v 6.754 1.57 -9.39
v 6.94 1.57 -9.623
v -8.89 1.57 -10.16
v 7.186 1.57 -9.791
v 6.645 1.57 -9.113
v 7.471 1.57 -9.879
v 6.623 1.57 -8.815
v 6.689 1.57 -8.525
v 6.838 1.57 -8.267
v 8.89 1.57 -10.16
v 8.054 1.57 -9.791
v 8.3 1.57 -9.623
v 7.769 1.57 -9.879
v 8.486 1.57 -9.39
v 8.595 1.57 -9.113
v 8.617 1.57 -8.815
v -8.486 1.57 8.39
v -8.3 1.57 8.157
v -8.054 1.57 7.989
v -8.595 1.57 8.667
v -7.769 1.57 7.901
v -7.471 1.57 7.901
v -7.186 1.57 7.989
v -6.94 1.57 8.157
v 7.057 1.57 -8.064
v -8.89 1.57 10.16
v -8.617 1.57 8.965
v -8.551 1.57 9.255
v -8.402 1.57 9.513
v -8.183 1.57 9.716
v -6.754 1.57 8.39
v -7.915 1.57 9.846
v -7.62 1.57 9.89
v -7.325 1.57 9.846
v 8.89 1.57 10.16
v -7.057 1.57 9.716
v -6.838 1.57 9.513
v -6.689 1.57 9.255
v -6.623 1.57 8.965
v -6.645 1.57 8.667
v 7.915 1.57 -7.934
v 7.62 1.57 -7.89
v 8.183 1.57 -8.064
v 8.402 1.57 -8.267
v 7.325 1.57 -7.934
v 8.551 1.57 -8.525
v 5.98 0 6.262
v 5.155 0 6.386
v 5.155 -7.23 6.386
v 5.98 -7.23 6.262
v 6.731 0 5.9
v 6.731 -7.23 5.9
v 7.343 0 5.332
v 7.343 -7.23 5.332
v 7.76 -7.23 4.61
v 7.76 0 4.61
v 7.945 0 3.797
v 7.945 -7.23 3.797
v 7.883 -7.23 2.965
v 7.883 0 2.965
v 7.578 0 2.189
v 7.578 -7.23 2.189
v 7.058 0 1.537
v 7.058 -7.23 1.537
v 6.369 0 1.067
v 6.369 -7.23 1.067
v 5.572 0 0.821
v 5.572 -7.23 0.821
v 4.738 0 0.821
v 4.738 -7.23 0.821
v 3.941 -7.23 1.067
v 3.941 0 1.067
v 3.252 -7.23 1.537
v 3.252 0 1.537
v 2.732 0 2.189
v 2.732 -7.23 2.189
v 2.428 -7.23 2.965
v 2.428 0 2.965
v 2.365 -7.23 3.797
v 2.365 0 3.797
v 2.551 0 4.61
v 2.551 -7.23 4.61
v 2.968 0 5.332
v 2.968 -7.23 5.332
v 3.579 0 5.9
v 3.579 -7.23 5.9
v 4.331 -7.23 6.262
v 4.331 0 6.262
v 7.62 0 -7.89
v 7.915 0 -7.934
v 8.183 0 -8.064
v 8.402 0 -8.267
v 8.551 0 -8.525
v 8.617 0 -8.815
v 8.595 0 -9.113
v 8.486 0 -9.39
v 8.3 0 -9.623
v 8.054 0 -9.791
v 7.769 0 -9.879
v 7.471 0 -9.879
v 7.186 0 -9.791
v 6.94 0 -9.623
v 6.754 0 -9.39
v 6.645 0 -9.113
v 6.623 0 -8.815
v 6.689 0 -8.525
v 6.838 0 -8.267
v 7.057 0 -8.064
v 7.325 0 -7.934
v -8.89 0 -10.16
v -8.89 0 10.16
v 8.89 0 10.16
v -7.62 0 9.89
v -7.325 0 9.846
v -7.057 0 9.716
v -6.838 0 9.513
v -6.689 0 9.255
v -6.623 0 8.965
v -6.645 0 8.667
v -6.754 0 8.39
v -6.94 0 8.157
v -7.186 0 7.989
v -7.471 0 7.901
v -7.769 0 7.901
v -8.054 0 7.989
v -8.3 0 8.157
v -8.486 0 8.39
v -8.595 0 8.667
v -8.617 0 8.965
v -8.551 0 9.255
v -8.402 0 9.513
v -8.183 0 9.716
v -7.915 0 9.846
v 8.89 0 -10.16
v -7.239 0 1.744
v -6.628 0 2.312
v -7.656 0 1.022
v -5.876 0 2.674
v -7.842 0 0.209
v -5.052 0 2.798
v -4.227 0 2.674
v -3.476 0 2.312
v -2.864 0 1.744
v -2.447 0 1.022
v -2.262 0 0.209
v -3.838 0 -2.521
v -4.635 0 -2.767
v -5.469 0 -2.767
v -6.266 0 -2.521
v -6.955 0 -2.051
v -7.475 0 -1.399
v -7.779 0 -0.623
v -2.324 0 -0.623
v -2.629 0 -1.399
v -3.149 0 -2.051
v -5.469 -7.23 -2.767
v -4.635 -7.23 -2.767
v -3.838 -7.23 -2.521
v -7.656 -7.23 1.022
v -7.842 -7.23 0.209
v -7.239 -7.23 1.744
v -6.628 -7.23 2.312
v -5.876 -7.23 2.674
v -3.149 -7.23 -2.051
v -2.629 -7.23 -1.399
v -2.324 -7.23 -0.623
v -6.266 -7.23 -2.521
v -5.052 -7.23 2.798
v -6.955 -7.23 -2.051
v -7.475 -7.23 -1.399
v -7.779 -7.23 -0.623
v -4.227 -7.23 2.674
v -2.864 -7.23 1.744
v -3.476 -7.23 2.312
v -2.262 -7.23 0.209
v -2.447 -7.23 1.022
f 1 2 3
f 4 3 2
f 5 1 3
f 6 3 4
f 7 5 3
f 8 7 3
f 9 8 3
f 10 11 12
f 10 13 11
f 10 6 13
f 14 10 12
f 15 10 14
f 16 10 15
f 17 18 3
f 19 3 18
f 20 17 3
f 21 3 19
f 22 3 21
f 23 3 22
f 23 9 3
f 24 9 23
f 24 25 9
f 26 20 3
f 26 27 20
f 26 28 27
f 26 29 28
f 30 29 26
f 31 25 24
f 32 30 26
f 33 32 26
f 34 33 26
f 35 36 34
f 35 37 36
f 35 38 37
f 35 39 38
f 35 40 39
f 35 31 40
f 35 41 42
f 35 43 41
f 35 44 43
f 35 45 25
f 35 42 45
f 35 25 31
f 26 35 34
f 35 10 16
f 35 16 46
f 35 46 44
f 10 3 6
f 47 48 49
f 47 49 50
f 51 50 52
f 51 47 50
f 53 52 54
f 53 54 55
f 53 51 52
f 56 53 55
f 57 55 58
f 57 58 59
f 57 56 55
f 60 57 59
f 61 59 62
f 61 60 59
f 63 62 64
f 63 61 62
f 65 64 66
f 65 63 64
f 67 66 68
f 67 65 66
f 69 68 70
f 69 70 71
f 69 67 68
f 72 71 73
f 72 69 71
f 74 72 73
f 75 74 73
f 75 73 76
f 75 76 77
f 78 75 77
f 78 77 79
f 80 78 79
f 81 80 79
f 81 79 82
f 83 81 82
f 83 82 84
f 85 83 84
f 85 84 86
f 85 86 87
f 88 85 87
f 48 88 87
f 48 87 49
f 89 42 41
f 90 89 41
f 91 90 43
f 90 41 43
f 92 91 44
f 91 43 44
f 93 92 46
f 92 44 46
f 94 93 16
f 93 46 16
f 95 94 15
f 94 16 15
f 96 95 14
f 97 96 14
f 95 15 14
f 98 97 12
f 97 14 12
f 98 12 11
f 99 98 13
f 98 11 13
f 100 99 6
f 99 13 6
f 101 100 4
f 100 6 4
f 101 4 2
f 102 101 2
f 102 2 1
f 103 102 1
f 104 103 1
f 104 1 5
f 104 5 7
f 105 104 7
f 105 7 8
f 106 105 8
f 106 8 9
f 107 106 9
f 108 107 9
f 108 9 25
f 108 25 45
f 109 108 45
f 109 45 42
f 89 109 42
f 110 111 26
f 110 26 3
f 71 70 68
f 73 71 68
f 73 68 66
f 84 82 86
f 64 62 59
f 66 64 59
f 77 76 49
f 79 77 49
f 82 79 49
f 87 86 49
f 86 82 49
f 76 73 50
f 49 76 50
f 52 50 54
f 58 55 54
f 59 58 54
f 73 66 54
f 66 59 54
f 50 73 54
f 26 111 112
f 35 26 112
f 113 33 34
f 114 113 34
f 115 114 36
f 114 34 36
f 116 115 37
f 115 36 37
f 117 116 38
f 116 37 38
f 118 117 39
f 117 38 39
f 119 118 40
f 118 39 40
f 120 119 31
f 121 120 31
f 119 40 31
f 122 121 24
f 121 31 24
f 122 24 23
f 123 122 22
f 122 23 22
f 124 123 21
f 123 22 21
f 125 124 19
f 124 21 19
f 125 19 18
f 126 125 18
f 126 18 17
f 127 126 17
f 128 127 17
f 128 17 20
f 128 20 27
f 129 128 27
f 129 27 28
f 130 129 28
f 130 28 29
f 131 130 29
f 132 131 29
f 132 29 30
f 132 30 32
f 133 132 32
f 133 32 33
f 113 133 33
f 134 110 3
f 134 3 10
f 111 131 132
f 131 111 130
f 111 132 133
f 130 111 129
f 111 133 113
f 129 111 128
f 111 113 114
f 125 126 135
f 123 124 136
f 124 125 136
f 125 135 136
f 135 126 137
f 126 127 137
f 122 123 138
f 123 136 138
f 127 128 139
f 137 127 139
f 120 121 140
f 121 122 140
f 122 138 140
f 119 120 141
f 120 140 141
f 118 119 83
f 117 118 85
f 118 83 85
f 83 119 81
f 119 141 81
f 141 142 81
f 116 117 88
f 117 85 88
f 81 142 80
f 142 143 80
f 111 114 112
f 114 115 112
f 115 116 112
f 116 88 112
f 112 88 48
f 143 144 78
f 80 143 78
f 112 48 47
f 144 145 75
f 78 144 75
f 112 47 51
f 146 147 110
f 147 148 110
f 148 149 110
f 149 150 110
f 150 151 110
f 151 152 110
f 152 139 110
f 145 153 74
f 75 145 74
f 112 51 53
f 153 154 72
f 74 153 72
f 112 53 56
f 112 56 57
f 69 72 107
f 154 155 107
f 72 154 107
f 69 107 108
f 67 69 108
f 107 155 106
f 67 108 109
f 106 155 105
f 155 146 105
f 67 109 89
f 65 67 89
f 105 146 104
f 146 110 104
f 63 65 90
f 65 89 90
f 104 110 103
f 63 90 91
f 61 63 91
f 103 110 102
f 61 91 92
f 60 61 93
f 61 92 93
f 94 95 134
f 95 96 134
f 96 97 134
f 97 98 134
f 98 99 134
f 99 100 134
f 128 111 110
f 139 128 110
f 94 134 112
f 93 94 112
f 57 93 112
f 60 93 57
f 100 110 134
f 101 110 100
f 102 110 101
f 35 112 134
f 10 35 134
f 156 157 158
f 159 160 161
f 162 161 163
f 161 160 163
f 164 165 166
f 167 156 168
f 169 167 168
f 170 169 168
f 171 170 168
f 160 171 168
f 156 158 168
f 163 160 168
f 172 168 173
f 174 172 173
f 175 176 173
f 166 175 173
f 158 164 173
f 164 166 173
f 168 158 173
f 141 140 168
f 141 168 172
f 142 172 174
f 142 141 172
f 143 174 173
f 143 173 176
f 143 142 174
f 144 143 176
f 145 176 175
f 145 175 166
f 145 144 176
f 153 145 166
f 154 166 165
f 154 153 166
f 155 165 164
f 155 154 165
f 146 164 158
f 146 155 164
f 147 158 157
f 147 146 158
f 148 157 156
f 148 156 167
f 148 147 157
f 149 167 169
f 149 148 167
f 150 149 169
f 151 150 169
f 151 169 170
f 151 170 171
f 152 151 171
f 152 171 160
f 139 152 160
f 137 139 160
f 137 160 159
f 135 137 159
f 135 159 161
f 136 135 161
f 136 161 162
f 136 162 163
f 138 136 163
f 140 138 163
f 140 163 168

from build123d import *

# Parameters (mm, degrees)
SKETCH1_W           = 17.78
SKETCH1_H           = 20.32
BOSS_EXTRUDE1_DEPTH = 1.57
SKETCH2_R           = 2.797878481
BOSS_EXTRUDE2_DEPTH = 8.8
SKETCH3_R           = 1
CUT_EXTRUDE1_DEPTH  = 17.115138845


with BuildPart() as part:
    # Sketch1 → Boss-Extrude1 (new body)
    with BuildSketch(Plane(origin=(0, 0, 0), x_dir=(1, 0, 0), z_dir=(0, 1, 0))):
        Rectangle(SKETCH1_W, SKETCH1_H)
    extrude(amount=BOSS_EXTRUDE1_DEPTH)

    # Sketch2 → Boss-Extrude2 (add)
    with BuildSketch(Plane(origin=(0, 1.57, 0), x_dir=(1, 0, 0), z_dir=(0, 1, 0))):
        with Locations(Location((5.155350165, -3.588020089, 0), (0, 0, 270))):
            Circle(SKETCH2_R)
        with Locations(Location((-5.051725036, 0, 0), (0, 0, 270))):
            Circle(SKETCH2_R)
    extrude(amount=-BOSS_EXTRUDE2_DEPTH)

    # Sketch3 → Cut-Extrude1 (cut, through all)
    with BuildSketch(Plane(origin=(0, 1.57, 0), x_dir=(1, 0, 0), z_dir=(0, 1, 0))):
        with Locations(Location((-7.62, -8.89, 0), (0, 0, 270))):
            Circle(SKETCH3_R)
        with Locations(Location((7.62, 8.89, 0), (0, 0, 270))):
            Circle(SKETCH3_R)
    extrude(amount=-CUT_EXTRUDE1_DEPTH, mode=Mode.SUBTRACT)


solid = part.part
